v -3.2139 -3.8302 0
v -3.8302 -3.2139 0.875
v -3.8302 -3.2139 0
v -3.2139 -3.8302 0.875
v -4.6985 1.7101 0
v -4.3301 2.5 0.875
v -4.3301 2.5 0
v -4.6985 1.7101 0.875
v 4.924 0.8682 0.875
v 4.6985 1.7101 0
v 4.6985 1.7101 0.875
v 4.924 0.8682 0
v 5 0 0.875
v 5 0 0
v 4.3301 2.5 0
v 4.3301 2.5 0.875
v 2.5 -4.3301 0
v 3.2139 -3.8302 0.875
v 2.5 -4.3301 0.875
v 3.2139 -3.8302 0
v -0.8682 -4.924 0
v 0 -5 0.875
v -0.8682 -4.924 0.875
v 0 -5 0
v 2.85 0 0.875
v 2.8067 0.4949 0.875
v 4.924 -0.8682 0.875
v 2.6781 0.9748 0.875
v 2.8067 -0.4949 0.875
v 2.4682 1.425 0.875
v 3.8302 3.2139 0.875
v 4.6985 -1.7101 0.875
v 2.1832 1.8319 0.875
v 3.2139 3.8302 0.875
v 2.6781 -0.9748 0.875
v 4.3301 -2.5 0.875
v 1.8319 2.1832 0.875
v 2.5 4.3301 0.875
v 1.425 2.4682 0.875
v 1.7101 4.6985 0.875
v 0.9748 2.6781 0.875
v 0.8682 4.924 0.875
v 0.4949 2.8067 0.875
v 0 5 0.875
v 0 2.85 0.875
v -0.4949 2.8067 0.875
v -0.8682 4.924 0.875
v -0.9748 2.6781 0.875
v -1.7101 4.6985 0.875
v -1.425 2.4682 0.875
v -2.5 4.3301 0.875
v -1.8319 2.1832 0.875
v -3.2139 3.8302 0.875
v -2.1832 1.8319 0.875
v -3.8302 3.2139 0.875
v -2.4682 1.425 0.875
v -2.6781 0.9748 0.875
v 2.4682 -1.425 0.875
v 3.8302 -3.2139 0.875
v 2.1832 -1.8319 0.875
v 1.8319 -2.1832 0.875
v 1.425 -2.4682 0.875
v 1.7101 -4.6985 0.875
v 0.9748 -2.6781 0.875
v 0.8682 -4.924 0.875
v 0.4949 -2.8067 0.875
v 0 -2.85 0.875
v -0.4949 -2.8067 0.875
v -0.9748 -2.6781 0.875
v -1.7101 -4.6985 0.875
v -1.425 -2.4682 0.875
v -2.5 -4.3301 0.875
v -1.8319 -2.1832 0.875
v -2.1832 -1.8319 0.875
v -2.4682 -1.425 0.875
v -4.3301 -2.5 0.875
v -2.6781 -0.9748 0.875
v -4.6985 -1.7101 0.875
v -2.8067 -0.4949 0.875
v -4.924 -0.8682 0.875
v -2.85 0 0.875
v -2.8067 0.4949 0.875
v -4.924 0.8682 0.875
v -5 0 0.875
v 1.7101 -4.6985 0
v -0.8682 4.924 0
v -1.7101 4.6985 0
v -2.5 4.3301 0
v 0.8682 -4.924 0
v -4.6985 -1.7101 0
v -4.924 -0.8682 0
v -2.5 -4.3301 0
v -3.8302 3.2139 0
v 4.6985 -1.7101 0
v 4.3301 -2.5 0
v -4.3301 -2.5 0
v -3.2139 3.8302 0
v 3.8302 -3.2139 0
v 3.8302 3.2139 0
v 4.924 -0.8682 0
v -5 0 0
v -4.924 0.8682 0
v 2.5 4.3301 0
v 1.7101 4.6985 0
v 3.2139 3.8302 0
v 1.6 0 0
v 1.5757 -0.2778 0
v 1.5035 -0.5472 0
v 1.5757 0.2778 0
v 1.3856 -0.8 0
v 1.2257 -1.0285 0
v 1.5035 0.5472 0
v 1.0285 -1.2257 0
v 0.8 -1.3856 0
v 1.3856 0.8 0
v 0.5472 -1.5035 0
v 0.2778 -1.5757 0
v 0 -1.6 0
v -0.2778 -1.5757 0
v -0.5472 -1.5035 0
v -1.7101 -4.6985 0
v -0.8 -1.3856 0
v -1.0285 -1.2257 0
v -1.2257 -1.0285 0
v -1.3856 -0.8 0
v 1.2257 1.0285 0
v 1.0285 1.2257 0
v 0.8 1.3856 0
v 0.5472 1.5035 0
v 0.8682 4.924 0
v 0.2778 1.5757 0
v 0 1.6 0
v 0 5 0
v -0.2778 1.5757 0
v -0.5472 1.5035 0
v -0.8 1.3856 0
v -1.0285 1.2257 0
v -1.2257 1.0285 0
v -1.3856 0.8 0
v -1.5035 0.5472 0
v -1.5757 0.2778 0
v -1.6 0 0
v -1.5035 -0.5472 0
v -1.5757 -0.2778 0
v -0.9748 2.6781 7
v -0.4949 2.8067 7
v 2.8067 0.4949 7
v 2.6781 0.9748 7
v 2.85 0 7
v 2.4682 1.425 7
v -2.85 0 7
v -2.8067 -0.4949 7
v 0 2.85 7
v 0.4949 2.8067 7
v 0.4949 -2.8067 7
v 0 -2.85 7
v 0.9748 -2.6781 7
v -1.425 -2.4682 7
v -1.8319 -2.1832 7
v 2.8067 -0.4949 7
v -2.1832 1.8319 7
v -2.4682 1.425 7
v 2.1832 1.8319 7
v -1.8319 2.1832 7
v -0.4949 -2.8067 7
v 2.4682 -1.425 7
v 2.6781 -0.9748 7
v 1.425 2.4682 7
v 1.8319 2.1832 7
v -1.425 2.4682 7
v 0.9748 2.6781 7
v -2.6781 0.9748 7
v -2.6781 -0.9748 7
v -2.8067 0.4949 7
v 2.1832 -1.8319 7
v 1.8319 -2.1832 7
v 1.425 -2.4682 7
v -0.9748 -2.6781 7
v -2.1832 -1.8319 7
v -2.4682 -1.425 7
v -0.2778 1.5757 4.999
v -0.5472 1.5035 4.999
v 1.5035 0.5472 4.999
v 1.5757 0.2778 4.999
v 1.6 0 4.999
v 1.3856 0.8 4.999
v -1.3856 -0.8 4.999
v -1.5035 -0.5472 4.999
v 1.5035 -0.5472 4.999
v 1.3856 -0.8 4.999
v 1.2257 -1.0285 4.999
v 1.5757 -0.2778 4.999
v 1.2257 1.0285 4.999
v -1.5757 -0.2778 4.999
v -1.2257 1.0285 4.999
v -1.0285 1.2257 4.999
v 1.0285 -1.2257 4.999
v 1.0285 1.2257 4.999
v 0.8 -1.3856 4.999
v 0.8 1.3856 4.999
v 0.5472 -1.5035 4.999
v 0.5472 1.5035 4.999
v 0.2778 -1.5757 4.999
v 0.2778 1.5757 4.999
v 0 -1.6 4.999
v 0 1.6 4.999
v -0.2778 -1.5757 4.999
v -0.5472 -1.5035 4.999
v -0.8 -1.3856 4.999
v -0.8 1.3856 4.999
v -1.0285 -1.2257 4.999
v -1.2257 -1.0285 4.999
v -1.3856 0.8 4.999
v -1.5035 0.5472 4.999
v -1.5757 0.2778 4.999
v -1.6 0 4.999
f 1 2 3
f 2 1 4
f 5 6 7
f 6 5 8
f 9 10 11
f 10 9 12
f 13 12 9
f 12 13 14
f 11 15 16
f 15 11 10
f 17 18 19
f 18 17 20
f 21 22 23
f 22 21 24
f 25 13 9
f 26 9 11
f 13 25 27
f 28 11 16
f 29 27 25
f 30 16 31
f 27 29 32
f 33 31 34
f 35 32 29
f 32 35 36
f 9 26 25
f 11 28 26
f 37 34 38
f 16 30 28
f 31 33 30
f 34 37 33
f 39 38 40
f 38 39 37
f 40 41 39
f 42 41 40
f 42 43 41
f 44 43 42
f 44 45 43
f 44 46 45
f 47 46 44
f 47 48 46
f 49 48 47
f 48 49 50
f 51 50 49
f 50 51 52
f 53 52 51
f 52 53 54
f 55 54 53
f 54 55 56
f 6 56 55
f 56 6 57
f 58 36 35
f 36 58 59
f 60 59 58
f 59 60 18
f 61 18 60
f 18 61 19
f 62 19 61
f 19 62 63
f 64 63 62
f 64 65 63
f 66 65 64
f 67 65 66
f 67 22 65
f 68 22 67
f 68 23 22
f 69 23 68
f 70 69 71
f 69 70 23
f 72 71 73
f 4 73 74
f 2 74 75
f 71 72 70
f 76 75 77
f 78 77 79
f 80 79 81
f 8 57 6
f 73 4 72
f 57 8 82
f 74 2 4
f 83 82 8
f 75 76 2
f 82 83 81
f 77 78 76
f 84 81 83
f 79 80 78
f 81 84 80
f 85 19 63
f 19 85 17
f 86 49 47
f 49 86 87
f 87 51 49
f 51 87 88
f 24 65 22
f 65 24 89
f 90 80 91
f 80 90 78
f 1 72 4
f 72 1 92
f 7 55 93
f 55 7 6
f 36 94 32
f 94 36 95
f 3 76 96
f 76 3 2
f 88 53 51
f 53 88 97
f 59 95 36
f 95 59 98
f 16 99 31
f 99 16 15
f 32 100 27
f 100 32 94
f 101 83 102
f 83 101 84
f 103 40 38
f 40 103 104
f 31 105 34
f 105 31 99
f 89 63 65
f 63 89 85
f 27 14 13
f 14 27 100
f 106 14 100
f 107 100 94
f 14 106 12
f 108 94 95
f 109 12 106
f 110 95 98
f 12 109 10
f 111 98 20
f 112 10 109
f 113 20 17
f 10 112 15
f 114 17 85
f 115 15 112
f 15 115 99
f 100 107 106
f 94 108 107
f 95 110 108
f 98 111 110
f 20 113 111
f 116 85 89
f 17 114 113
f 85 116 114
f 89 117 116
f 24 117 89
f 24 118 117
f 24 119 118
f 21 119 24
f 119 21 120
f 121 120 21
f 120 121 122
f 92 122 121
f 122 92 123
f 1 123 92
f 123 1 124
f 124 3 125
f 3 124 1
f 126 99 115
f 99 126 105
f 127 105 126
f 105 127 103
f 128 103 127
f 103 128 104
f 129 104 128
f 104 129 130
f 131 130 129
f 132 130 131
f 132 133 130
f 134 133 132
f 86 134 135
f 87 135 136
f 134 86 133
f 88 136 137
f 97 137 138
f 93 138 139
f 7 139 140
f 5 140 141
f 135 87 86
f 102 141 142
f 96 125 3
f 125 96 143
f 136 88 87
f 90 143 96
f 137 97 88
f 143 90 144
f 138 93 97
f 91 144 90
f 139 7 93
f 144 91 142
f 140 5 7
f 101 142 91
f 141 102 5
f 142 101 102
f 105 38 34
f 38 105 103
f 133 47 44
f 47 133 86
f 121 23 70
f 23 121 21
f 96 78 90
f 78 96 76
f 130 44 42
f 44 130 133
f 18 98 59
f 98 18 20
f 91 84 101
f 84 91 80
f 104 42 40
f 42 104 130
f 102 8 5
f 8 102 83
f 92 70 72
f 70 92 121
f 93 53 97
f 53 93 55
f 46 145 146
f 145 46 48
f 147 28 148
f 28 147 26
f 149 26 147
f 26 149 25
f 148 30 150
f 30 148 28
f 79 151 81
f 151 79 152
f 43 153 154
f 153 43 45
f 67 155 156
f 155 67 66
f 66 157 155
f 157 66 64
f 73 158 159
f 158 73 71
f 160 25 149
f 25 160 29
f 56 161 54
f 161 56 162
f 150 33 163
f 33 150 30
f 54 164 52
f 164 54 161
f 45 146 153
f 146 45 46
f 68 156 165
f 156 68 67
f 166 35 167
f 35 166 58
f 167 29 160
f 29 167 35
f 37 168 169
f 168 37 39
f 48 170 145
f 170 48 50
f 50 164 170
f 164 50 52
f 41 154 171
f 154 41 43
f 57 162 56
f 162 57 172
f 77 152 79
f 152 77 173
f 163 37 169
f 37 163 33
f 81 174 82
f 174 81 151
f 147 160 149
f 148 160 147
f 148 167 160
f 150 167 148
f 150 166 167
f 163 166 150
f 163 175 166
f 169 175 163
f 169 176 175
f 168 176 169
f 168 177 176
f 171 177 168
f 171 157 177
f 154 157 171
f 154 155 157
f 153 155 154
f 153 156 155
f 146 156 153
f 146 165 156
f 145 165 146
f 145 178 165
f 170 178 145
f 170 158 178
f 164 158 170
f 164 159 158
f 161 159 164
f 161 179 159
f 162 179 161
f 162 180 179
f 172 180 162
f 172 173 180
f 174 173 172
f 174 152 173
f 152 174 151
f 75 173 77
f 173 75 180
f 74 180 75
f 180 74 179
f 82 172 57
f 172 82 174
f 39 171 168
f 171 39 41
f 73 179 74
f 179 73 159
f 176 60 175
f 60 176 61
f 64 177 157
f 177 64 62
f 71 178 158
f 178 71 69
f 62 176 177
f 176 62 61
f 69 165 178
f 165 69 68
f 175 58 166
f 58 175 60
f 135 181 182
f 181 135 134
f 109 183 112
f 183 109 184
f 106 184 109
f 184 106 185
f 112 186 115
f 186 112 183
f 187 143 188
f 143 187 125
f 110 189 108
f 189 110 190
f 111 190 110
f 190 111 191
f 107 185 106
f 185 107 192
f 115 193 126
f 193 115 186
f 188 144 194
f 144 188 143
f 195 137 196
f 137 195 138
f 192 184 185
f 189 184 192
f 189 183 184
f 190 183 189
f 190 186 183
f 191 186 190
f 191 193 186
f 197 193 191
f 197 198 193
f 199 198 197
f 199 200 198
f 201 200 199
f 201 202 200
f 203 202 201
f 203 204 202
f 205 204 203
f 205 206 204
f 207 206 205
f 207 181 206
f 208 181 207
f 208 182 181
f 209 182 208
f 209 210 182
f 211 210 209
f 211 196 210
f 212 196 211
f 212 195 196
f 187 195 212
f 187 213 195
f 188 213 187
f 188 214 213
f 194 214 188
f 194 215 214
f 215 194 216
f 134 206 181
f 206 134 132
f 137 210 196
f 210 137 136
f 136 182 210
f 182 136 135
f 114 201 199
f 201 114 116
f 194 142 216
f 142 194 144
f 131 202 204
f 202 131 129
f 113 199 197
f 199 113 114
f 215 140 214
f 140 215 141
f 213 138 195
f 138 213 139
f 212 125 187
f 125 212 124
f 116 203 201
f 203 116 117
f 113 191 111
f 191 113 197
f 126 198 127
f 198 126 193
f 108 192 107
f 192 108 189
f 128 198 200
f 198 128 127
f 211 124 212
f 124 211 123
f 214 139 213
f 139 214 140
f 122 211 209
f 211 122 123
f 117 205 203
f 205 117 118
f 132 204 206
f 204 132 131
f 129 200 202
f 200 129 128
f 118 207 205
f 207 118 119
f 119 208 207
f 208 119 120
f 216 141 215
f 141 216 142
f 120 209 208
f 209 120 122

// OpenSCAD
//
//  Spring tensioner "thingy" for metal extruder for 3D Printer
//  Sarah Kelley, 5/13/2020
//
//  Provides the ability to use a screw to increase the
//  tension on the extruder by compressing the spring
//  a little bit more.
//
//  Some extruder brackets already come with a metal "thingy"
//  to serve this purpose, but mine did not... so why not print one?
//
//  Will it be strong enough? Time will tell. (probably "no").
//  Recommend printing in thin layers with 100% infill.
//  A slow-ish print speed is also probably a good idea.
//
//  Addendum: on the Creality metal extruder, the "thingy" is
//  something called a "rivet nut", and you can buy them!
//  They're made out of metal and SIGNIFICANTLY less likely to
//  break than this little thing. 
//
//  Oh, and just FYI, the Creality metal extruder has an M3 rivet nut
//  sitting on top of an M4 tension screw, which keeps it on top because it
//  won't gradually screw itself in. The generic metal extruders I have
//  use M3 screws, and I've yet to locate a corresponding M2 rivet nut
//  (though I found other sizes on Amazon).
//  Sooo.... more research is needed? 

//
//  Copyright (c) 2020 Sarah Kelley, sarah@sakelley.org
//
//  Permission is hereby granted, free of charge, to any person obtaining a copy
//  of this software and associated documentation files (the "Software"), to deal
//  in the Software without restriction, including without limitation the rights
//  to use, copy, modify, merge, publish, distribute, sublicense, and/or sell
//  copies of the Software, and to permit persons to whom the Software is
//  furnished to do so, subject to the following conditions:
//  
//  The above copyright notice and this permission notice shall be included in all
//  copies or substantial portions of the Software.
//  
//  THE SOFTWARE IS PROVIDED "AS IS", WITHOUT WARRANTY OF ANY KIND, EXPRESS OR
//  IMPLIED, INCLUDING BUT NOT LIMITED TO THE WARRANTIES OF MERCHANTABILITY,
//  FITNESS FOR A PARTICULAR PURPOSE AND NONINFRINGEMENT. IN NO EVENT SHALL THE
//  AUTHORS OR COPYRIGHT HOLDERS BE LIABLE FOR ANY CLAIM, DAMAGES OR OTHER
//  LIABILITY, WHETHER IN AN ACTION OF CONTRACT, TORT OR OTHERWISE, ARISING FROM,
//  OUT OF OR IN CONNECTION WITH THE SOFTWARE OR THE USE OR OTHER DEALINGS IN THE
//  SOFTWARE.
//

// Slightly larger than the 8.24mm outer diameter of the spring
baseWidth = 10.0;

// Printing in layers this thick
layerSize = 0.04375;

// Number of layers for the base
numLayers = 20;

// Thicker: better support for spring. Thinner: adds less tension by default.
baseHeight = layerSize * numLayers;

// By eyeball, needs to fit in extruder mechanism and not "use up" the spring
totalHeight = 7.0;

// Inside of spring is about 5.8mm
insideWidth = 5.7;

// Must fit the M3 tensioning screw inside, bigger than 2.8, but shouldn't be too loose
hollowWidth = 3.2;

// How far screw will extend into the part before pushing it and the spring
hollowHeight = 5.0; 

// height for spacerThingy (optional, for other side of spring)
spacerHeight = 4.2;

// number of faces to give the cylinders
$fn=36;

module tensionerThingy() {
    difference() {
        union() {
            // base part that holds the spring
            translate([0,0,baseHeight/2]) 
                cylinder(h=baseHeight, d=baseWidth, center=true);
            
            // inside part, goes inside the spring
            translate([0,0,totalHeight/2]) 
                cylinder(h=totalHeight, d=insideWidth, center=true);
        }
        
        // carve out the hollow where the tensioning screw will rest.
        // part of the screw is "used up" to provide stability
        // the rest of the screw can be rotated to move this gadget back and
        // forth to adjust the tension a little bit.
        translate([0,0,(hollowHeight/2)-0.001]) 
            cylinder(h=hollowHeight, d=hollowWidth, center=true);
    }
}

// This is just a simple cylindrical spacer
// Optional, but can use on the screw opposite the
// tensionerThingy for a more symmetric look.

module spacerThingy() {
    difference() {
        // spacer outside
        translate([0,0,spacerHeight/2]) 
            cylinder(h=spacerHeight, d=insideWidth, center=true);
        
        // spacer inside
        translate([0,0,(spacerHeight/2)]) 
            cylinder(h=spacerHeight+0.001, d=hollowWidth, center=true);
    }
}


tensionerThingy();
//spacerThingy();
